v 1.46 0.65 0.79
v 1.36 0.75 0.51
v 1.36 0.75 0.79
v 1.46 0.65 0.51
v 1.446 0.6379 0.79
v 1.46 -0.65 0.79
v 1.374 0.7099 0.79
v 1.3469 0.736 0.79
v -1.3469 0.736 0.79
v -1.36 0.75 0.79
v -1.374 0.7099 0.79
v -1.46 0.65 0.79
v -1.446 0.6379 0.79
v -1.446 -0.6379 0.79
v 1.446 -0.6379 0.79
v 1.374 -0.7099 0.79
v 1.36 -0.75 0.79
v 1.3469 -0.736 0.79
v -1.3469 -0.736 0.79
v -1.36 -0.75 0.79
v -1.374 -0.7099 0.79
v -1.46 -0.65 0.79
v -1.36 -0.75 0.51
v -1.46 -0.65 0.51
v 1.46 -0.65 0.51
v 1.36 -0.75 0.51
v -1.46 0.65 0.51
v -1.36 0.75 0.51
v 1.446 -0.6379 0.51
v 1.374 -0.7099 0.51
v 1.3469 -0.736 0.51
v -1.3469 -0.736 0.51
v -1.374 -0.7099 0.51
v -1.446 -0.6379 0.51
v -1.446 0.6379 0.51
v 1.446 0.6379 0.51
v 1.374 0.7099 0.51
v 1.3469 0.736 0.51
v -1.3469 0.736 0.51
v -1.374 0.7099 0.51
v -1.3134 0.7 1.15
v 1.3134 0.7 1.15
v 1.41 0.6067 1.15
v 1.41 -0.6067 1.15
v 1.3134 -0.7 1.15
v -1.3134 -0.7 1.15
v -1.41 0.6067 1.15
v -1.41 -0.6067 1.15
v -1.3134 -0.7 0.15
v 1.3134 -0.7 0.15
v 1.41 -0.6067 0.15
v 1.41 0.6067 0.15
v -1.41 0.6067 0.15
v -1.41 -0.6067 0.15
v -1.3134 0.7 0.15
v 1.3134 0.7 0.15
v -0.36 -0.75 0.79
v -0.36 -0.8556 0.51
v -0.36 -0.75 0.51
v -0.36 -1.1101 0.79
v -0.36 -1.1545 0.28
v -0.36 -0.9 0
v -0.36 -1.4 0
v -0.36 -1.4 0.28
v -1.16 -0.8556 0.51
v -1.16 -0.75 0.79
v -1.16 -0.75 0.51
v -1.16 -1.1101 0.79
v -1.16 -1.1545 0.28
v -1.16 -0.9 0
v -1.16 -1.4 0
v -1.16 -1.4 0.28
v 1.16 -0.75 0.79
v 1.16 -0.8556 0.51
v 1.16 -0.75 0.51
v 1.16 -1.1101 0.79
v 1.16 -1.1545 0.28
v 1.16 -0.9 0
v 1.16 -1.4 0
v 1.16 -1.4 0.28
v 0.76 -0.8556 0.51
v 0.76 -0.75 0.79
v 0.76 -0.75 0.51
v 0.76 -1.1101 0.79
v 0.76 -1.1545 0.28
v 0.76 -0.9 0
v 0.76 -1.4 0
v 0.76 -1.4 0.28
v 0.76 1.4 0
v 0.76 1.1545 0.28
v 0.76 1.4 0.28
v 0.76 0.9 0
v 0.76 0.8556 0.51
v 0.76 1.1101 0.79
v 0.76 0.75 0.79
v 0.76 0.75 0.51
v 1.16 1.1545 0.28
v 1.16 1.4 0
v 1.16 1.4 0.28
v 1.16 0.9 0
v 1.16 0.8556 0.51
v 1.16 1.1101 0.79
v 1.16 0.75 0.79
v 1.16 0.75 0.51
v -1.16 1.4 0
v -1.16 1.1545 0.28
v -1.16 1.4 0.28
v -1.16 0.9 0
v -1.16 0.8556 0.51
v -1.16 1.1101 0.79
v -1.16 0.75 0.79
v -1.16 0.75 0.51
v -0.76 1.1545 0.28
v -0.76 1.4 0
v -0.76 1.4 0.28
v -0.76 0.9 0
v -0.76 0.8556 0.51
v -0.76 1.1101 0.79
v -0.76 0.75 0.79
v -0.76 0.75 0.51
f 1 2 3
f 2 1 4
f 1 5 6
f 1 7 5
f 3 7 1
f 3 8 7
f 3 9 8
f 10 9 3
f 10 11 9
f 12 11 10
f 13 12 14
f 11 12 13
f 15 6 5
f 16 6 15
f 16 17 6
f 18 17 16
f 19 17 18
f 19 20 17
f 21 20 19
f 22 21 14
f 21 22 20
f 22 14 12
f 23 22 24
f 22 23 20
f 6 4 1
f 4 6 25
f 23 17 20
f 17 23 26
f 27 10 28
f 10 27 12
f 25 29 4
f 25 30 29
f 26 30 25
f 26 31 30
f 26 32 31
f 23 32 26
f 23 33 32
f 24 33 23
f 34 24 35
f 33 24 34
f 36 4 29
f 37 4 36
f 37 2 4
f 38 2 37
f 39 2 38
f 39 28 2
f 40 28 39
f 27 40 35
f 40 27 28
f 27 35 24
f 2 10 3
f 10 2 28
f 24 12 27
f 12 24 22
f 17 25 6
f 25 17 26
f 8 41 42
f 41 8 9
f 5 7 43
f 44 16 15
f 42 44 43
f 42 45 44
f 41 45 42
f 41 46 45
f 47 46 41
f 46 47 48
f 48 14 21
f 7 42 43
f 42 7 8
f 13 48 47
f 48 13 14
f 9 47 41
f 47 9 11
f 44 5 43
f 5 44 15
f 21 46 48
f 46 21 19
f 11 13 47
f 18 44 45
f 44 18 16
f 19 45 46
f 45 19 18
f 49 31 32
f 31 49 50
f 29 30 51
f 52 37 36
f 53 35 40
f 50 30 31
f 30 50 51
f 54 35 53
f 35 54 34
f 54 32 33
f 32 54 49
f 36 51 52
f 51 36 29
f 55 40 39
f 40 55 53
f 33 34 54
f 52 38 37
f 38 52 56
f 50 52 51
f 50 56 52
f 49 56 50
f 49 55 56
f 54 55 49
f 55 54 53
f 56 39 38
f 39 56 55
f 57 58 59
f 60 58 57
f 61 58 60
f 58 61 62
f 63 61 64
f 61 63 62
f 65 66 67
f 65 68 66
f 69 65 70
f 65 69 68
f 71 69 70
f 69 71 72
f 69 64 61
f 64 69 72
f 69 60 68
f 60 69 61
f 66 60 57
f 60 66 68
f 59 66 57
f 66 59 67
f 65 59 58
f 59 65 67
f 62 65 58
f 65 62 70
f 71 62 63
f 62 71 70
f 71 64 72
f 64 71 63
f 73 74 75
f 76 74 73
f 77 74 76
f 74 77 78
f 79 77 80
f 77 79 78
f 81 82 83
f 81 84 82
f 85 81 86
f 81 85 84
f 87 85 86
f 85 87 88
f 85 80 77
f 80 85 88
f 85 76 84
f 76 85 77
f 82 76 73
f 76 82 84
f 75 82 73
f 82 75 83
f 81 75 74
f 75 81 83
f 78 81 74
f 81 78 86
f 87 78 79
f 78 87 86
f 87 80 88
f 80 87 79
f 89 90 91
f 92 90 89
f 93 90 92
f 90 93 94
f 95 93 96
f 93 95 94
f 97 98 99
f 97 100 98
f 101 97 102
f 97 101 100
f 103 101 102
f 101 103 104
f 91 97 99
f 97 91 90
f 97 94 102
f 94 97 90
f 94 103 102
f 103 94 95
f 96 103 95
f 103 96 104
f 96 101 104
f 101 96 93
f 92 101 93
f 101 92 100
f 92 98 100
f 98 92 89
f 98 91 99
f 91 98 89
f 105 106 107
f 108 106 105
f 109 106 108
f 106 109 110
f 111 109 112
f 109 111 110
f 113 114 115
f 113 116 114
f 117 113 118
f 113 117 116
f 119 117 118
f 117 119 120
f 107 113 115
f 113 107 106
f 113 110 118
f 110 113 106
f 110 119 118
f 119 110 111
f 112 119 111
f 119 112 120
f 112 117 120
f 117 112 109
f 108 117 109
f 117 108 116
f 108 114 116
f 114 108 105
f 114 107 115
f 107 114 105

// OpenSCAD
pin_pitch = 0.96;
pin_width = 0.4;
pin_seating = 0.5;
pin_gull_angle = 5;
leadframe_thickness = 0.28;

overall_width = 2.8;
body_width = 1.5;
body_length = 2.92;
body_thickness = 1;

total_thickness = 1.15;

body_length_bevel = 0.1;
body_width_bevel = 0.1;
body_chamfer = 0.1;


leadframe_height = total_thickness - body_thickness/2;

index_mark_offset = min(min(body_width, body_length) * 0.3, 1.5);
index_mark_radius = min(index_mark_offset / 3, 0.5);


//difference() {
    body();
//    color("#ddd") translate([
//        -body_length / 2 + index_mark_offset,
//        -body_width / 2 + index_mark_offset,
//        total_thickness - 0.1,
//    ]) cylinder(h = 10, r = index_mark_radius, $fn=32);
//}


rotate([0, 0, 180]) {
    translate([pin_pitch - 0.2, overall_width / 2, 0]) pin(pin_width + 0.4);
    translate([-pin_pitch, overall_width / 2, 0]) pin(pin_width);
}
translate([pin_pitch, overall_width / 2, 0]) pin(pin_width);
translate([-pin_pitch, overall_width / 2, 0]) pin(pin_width);


module pin(width) {
    color("#999") rotate([90, 0, 90]) linear_extrude(height = width, center = true) {
        gull_offset = leadframe_height - leadframe_thickness / 2;
        pin_length = (overall_width - body_width) / 2;
        sine = sin(pin_gull_angle);
        cosine = cos(pin_gull_angle);
        polygon([
            [0, 0],
            [-pin_seating, 0],
            [-pin_seating - sine * gull_offset, gull_offset],
            [-pin_length, gull_offset],
            [-pin_length, gull_offset + leadframe_thickness],
            [-pin_seating - sine * (gull_offset + leadframe_thickness) + cosine * leadframe_thickness, gull_offset + leadframe_thickness],
            [-pin_seating - sine * leadframe_thickness + cosine * leadframe_thickness, leadframe_thickness],
            [0, leadframe_thickness],
        ]);
    }
}


module body() {
    color("#555") translate([0, 0, leadframe_height]) {
        linear_extrude(height = leadframe_thickness, center = true) body_outline();
        linear_extrude(
            height = body_thickness / 2,
            scale = [(body_length - body_length_bevel) / body_length, (body_width - body_width_bevel) / body_width]
        ) body_outline();
        
        rotate([180, 0, 0]) linear_extrude(
            height = body_thickness / 2,
            scale = [(body_length - body_length_bevel) / body_length, (body_width - body_width_bevel) / body_width]
        ) body_outline();
    }
}
module body_outline() {
    polygon([
        [ -body_length/2 + body_chamfer, -body_width/2 ],
        [ -body_length/2               , -body_width/2 + body_chamfer ],
        [ -body_length/2               , +body_width/2 - body_chamfer ],
        [ -body_length/2 + body_chamfer, +body_width/2 ],
        [ +body_length/2 - body_chamfer, +body_width/2 ],
        [ +body_length/2               , +body_width/2 - body_chamfer ],
        [ +body_length/2               , -body_width/2 + body_chamfer ],
        [ +body_length/2 - body_chamfer, -body_width/2 ],
    ]);
}
